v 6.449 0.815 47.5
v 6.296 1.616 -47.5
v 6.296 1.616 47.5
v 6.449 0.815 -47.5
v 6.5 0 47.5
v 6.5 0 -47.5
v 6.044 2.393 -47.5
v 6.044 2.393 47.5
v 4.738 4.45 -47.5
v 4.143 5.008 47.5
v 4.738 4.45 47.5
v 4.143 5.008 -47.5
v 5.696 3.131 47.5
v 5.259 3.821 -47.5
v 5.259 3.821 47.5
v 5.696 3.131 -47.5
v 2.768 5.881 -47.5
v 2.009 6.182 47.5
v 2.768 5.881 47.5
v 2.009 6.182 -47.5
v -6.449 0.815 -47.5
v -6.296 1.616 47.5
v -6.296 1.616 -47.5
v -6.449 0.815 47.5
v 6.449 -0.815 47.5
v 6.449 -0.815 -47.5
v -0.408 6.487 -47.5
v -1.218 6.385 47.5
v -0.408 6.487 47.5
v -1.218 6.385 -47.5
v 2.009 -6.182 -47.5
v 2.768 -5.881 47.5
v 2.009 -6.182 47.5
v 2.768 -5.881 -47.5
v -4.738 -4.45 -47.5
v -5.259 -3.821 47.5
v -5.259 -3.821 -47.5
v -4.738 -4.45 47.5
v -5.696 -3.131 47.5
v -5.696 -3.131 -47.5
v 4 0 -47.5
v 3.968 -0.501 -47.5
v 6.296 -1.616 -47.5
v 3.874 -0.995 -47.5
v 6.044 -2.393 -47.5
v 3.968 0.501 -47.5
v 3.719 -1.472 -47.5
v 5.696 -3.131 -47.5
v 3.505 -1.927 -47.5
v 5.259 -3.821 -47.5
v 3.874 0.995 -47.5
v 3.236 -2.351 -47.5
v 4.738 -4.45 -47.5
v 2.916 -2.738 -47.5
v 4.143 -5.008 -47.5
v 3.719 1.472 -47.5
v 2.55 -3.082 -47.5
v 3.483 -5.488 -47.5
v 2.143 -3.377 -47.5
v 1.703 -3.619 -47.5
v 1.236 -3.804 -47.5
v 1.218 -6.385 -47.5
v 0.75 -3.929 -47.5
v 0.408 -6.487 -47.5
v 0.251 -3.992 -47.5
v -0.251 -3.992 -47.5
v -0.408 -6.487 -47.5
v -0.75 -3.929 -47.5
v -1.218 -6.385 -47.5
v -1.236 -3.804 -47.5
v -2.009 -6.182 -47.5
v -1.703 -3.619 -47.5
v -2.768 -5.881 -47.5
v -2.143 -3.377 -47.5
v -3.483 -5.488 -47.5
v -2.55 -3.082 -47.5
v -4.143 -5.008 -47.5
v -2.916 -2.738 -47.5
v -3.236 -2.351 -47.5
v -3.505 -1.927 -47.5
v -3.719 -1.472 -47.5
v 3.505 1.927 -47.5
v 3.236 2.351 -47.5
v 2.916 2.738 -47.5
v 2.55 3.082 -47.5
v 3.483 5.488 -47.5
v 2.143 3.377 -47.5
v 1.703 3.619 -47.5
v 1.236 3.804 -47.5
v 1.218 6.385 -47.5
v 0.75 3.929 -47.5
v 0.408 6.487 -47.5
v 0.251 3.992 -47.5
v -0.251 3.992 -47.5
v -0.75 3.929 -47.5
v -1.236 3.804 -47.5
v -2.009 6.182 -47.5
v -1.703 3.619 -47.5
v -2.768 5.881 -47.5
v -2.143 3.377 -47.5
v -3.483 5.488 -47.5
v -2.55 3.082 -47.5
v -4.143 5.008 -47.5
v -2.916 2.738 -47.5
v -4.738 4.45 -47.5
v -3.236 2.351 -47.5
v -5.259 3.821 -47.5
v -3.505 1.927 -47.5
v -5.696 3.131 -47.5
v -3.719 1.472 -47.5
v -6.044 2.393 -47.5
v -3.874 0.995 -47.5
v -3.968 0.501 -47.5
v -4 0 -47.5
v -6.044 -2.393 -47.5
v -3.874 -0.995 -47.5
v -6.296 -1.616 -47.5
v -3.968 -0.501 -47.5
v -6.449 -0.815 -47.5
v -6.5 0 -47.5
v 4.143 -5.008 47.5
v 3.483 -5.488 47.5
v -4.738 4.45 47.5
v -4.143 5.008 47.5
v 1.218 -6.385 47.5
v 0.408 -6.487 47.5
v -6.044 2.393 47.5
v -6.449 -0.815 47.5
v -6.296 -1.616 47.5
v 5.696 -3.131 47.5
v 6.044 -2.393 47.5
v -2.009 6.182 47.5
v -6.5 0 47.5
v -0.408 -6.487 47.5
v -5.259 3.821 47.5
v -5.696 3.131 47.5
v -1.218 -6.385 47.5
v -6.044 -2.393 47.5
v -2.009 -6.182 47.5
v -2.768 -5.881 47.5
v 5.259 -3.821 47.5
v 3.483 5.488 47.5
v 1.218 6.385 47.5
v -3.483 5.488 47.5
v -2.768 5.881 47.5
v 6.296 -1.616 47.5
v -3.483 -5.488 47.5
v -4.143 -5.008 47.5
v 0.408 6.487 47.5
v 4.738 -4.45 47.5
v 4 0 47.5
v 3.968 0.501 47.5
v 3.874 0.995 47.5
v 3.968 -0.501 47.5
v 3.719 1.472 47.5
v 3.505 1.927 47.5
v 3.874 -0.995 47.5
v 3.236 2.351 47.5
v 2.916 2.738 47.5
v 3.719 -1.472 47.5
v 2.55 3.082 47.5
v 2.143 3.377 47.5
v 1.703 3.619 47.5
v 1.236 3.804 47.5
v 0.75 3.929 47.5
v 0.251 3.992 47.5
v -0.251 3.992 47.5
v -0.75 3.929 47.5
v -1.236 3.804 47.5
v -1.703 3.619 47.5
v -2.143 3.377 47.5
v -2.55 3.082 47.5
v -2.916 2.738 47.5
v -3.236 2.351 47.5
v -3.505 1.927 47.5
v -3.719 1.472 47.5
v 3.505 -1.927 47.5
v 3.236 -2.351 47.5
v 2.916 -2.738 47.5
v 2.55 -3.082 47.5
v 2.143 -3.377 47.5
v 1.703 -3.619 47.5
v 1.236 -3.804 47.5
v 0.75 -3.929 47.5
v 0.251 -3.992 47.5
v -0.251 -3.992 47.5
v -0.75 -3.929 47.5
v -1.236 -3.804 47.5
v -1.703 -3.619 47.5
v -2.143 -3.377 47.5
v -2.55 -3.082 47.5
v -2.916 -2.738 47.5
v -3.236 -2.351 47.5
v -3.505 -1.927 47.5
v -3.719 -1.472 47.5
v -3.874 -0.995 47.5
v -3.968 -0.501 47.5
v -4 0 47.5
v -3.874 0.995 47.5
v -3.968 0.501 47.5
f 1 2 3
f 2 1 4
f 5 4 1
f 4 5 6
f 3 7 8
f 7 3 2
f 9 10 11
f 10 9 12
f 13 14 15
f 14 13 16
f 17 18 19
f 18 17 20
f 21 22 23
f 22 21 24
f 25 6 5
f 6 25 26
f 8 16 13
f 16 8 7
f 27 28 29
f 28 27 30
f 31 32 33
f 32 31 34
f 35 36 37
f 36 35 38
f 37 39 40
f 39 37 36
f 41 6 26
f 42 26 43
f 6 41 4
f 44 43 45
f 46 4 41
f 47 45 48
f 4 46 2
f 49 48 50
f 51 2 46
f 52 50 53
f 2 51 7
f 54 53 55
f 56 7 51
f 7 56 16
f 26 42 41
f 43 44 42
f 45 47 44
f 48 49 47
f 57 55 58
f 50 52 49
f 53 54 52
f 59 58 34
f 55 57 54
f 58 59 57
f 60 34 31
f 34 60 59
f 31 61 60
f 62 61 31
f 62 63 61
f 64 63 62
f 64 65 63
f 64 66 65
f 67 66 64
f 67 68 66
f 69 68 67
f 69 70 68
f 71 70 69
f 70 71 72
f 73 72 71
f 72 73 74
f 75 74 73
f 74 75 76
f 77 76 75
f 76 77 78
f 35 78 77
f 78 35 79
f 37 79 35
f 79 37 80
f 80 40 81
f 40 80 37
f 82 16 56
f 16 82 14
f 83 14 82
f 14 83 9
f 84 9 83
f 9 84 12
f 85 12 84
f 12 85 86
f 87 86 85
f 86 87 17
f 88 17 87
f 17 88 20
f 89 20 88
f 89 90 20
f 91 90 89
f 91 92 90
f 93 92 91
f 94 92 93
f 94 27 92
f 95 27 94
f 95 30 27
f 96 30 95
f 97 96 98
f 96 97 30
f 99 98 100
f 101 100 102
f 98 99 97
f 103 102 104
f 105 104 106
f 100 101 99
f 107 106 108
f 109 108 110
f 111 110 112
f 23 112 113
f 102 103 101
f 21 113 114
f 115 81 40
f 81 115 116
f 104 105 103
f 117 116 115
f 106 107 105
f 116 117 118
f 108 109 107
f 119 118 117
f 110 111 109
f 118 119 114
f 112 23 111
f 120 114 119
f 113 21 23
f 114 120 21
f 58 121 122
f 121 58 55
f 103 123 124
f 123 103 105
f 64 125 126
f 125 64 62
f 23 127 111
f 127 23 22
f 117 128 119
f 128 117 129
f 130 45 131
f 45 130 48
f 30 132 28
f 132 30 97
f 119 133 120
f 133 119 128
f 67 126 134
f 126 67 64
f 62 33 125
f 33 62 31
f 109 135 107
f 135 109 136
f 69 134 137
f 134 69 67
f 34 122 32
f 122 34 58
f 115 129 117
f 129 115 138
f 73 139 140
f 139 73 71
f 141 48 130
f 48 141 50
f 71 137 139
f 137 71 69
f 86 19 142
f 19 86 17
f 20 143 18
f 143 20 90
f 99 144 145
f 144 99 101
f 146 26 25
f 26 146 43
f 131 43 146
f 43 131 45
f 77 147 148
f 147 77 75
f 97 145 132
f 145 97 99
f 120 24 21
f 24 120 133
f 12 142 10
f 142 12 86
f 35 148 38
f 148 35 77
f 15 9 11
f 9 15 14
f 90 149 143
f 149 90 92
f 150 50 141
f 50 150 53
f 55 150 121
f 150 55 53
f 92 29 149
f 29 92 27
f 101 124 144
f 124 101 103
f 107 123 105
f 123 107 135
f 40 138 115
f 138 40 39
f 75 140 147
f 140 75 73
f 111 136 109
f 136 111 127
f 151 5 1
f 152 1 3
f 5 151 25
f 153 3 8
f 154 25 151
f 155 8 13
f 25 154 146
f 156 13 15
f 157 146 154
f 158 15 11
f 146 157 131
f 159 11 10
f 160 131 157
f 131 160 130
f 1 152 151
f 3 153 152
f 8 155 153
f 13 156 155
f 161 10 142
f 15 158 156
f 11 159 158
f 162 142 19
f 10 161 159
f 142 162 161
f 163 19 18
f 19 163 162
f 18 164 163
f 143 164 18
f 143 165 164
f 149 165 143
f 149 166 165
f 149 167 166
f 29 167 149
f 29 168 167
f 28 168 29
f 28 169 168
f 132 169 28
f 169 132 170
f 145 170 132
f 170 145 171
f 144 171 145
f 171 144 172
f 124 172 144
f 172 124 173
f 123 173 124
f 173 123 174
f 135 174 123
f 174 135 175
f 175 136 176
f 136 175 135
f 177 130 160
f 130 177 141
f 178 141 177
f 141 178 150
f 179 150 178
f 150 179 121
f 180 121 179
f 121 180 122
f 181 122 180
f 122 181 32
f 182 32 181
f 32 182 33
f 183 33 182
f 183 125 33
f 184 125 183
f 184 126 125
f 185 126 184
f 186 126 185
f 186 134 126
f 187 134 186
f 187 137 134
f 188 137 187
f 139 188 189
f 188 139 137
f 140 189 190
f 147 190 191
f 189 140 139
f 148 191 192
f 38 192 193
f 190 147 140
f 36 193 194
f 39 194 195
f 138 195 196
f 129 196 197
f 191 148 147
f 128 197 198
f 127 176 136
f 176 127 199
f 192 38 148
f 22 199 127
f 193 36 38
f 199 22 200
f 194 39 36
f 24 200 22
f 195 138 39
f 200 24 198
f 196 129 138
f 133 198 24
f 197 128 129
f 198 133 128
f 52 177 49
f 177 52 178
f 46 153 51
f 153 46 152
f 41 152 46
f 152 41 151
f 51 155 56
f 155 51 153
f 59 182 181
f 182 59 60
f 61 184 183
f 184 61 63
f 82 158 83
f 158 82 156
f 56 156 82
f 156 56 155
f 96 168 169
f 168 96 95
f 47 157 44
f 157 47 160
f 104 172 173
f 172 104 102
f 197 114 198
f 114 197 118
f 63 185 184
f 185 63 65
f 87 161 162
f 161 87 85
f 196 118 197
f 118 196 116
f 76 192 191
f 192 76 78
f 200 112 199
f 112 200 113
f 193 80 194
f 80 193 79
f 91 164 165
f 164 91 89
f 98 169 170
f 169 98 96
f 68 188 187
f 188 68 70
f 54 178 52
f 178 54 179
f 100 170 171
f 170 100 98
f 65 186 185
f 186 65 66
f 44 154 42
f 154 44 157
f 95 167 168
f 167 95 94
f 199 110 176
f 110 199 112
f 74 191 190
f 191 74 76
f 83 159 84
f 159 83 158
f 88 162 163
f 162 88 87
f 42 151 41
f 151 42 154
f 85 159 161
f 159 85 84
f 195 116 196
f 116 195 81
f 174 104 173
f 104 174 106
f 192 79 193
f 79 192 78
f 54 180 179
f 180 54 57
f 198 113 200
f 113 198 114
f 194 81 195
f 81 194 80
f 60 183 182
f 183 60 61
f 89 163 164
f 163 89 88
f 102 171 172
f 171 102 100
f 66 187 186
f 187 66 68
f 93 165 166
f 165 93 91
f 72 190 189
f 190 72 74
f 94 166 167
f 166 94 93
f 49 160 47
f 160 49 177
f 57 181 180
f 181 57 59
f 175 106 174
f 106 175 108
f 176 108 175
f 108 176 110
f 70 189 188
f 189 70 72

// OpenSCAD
$fn = 50;


difference() {
	union() {
		translate(v = [0, 0, -47.5000000000]) {
			cylinder(h = 95, r = 6.5000000000);
		}
	}
	union() {
		translate(v = [0, 0, -100.0000000000]) {
			cylinder(h = 200, r = 4.0000000000);
		}
	}
}
